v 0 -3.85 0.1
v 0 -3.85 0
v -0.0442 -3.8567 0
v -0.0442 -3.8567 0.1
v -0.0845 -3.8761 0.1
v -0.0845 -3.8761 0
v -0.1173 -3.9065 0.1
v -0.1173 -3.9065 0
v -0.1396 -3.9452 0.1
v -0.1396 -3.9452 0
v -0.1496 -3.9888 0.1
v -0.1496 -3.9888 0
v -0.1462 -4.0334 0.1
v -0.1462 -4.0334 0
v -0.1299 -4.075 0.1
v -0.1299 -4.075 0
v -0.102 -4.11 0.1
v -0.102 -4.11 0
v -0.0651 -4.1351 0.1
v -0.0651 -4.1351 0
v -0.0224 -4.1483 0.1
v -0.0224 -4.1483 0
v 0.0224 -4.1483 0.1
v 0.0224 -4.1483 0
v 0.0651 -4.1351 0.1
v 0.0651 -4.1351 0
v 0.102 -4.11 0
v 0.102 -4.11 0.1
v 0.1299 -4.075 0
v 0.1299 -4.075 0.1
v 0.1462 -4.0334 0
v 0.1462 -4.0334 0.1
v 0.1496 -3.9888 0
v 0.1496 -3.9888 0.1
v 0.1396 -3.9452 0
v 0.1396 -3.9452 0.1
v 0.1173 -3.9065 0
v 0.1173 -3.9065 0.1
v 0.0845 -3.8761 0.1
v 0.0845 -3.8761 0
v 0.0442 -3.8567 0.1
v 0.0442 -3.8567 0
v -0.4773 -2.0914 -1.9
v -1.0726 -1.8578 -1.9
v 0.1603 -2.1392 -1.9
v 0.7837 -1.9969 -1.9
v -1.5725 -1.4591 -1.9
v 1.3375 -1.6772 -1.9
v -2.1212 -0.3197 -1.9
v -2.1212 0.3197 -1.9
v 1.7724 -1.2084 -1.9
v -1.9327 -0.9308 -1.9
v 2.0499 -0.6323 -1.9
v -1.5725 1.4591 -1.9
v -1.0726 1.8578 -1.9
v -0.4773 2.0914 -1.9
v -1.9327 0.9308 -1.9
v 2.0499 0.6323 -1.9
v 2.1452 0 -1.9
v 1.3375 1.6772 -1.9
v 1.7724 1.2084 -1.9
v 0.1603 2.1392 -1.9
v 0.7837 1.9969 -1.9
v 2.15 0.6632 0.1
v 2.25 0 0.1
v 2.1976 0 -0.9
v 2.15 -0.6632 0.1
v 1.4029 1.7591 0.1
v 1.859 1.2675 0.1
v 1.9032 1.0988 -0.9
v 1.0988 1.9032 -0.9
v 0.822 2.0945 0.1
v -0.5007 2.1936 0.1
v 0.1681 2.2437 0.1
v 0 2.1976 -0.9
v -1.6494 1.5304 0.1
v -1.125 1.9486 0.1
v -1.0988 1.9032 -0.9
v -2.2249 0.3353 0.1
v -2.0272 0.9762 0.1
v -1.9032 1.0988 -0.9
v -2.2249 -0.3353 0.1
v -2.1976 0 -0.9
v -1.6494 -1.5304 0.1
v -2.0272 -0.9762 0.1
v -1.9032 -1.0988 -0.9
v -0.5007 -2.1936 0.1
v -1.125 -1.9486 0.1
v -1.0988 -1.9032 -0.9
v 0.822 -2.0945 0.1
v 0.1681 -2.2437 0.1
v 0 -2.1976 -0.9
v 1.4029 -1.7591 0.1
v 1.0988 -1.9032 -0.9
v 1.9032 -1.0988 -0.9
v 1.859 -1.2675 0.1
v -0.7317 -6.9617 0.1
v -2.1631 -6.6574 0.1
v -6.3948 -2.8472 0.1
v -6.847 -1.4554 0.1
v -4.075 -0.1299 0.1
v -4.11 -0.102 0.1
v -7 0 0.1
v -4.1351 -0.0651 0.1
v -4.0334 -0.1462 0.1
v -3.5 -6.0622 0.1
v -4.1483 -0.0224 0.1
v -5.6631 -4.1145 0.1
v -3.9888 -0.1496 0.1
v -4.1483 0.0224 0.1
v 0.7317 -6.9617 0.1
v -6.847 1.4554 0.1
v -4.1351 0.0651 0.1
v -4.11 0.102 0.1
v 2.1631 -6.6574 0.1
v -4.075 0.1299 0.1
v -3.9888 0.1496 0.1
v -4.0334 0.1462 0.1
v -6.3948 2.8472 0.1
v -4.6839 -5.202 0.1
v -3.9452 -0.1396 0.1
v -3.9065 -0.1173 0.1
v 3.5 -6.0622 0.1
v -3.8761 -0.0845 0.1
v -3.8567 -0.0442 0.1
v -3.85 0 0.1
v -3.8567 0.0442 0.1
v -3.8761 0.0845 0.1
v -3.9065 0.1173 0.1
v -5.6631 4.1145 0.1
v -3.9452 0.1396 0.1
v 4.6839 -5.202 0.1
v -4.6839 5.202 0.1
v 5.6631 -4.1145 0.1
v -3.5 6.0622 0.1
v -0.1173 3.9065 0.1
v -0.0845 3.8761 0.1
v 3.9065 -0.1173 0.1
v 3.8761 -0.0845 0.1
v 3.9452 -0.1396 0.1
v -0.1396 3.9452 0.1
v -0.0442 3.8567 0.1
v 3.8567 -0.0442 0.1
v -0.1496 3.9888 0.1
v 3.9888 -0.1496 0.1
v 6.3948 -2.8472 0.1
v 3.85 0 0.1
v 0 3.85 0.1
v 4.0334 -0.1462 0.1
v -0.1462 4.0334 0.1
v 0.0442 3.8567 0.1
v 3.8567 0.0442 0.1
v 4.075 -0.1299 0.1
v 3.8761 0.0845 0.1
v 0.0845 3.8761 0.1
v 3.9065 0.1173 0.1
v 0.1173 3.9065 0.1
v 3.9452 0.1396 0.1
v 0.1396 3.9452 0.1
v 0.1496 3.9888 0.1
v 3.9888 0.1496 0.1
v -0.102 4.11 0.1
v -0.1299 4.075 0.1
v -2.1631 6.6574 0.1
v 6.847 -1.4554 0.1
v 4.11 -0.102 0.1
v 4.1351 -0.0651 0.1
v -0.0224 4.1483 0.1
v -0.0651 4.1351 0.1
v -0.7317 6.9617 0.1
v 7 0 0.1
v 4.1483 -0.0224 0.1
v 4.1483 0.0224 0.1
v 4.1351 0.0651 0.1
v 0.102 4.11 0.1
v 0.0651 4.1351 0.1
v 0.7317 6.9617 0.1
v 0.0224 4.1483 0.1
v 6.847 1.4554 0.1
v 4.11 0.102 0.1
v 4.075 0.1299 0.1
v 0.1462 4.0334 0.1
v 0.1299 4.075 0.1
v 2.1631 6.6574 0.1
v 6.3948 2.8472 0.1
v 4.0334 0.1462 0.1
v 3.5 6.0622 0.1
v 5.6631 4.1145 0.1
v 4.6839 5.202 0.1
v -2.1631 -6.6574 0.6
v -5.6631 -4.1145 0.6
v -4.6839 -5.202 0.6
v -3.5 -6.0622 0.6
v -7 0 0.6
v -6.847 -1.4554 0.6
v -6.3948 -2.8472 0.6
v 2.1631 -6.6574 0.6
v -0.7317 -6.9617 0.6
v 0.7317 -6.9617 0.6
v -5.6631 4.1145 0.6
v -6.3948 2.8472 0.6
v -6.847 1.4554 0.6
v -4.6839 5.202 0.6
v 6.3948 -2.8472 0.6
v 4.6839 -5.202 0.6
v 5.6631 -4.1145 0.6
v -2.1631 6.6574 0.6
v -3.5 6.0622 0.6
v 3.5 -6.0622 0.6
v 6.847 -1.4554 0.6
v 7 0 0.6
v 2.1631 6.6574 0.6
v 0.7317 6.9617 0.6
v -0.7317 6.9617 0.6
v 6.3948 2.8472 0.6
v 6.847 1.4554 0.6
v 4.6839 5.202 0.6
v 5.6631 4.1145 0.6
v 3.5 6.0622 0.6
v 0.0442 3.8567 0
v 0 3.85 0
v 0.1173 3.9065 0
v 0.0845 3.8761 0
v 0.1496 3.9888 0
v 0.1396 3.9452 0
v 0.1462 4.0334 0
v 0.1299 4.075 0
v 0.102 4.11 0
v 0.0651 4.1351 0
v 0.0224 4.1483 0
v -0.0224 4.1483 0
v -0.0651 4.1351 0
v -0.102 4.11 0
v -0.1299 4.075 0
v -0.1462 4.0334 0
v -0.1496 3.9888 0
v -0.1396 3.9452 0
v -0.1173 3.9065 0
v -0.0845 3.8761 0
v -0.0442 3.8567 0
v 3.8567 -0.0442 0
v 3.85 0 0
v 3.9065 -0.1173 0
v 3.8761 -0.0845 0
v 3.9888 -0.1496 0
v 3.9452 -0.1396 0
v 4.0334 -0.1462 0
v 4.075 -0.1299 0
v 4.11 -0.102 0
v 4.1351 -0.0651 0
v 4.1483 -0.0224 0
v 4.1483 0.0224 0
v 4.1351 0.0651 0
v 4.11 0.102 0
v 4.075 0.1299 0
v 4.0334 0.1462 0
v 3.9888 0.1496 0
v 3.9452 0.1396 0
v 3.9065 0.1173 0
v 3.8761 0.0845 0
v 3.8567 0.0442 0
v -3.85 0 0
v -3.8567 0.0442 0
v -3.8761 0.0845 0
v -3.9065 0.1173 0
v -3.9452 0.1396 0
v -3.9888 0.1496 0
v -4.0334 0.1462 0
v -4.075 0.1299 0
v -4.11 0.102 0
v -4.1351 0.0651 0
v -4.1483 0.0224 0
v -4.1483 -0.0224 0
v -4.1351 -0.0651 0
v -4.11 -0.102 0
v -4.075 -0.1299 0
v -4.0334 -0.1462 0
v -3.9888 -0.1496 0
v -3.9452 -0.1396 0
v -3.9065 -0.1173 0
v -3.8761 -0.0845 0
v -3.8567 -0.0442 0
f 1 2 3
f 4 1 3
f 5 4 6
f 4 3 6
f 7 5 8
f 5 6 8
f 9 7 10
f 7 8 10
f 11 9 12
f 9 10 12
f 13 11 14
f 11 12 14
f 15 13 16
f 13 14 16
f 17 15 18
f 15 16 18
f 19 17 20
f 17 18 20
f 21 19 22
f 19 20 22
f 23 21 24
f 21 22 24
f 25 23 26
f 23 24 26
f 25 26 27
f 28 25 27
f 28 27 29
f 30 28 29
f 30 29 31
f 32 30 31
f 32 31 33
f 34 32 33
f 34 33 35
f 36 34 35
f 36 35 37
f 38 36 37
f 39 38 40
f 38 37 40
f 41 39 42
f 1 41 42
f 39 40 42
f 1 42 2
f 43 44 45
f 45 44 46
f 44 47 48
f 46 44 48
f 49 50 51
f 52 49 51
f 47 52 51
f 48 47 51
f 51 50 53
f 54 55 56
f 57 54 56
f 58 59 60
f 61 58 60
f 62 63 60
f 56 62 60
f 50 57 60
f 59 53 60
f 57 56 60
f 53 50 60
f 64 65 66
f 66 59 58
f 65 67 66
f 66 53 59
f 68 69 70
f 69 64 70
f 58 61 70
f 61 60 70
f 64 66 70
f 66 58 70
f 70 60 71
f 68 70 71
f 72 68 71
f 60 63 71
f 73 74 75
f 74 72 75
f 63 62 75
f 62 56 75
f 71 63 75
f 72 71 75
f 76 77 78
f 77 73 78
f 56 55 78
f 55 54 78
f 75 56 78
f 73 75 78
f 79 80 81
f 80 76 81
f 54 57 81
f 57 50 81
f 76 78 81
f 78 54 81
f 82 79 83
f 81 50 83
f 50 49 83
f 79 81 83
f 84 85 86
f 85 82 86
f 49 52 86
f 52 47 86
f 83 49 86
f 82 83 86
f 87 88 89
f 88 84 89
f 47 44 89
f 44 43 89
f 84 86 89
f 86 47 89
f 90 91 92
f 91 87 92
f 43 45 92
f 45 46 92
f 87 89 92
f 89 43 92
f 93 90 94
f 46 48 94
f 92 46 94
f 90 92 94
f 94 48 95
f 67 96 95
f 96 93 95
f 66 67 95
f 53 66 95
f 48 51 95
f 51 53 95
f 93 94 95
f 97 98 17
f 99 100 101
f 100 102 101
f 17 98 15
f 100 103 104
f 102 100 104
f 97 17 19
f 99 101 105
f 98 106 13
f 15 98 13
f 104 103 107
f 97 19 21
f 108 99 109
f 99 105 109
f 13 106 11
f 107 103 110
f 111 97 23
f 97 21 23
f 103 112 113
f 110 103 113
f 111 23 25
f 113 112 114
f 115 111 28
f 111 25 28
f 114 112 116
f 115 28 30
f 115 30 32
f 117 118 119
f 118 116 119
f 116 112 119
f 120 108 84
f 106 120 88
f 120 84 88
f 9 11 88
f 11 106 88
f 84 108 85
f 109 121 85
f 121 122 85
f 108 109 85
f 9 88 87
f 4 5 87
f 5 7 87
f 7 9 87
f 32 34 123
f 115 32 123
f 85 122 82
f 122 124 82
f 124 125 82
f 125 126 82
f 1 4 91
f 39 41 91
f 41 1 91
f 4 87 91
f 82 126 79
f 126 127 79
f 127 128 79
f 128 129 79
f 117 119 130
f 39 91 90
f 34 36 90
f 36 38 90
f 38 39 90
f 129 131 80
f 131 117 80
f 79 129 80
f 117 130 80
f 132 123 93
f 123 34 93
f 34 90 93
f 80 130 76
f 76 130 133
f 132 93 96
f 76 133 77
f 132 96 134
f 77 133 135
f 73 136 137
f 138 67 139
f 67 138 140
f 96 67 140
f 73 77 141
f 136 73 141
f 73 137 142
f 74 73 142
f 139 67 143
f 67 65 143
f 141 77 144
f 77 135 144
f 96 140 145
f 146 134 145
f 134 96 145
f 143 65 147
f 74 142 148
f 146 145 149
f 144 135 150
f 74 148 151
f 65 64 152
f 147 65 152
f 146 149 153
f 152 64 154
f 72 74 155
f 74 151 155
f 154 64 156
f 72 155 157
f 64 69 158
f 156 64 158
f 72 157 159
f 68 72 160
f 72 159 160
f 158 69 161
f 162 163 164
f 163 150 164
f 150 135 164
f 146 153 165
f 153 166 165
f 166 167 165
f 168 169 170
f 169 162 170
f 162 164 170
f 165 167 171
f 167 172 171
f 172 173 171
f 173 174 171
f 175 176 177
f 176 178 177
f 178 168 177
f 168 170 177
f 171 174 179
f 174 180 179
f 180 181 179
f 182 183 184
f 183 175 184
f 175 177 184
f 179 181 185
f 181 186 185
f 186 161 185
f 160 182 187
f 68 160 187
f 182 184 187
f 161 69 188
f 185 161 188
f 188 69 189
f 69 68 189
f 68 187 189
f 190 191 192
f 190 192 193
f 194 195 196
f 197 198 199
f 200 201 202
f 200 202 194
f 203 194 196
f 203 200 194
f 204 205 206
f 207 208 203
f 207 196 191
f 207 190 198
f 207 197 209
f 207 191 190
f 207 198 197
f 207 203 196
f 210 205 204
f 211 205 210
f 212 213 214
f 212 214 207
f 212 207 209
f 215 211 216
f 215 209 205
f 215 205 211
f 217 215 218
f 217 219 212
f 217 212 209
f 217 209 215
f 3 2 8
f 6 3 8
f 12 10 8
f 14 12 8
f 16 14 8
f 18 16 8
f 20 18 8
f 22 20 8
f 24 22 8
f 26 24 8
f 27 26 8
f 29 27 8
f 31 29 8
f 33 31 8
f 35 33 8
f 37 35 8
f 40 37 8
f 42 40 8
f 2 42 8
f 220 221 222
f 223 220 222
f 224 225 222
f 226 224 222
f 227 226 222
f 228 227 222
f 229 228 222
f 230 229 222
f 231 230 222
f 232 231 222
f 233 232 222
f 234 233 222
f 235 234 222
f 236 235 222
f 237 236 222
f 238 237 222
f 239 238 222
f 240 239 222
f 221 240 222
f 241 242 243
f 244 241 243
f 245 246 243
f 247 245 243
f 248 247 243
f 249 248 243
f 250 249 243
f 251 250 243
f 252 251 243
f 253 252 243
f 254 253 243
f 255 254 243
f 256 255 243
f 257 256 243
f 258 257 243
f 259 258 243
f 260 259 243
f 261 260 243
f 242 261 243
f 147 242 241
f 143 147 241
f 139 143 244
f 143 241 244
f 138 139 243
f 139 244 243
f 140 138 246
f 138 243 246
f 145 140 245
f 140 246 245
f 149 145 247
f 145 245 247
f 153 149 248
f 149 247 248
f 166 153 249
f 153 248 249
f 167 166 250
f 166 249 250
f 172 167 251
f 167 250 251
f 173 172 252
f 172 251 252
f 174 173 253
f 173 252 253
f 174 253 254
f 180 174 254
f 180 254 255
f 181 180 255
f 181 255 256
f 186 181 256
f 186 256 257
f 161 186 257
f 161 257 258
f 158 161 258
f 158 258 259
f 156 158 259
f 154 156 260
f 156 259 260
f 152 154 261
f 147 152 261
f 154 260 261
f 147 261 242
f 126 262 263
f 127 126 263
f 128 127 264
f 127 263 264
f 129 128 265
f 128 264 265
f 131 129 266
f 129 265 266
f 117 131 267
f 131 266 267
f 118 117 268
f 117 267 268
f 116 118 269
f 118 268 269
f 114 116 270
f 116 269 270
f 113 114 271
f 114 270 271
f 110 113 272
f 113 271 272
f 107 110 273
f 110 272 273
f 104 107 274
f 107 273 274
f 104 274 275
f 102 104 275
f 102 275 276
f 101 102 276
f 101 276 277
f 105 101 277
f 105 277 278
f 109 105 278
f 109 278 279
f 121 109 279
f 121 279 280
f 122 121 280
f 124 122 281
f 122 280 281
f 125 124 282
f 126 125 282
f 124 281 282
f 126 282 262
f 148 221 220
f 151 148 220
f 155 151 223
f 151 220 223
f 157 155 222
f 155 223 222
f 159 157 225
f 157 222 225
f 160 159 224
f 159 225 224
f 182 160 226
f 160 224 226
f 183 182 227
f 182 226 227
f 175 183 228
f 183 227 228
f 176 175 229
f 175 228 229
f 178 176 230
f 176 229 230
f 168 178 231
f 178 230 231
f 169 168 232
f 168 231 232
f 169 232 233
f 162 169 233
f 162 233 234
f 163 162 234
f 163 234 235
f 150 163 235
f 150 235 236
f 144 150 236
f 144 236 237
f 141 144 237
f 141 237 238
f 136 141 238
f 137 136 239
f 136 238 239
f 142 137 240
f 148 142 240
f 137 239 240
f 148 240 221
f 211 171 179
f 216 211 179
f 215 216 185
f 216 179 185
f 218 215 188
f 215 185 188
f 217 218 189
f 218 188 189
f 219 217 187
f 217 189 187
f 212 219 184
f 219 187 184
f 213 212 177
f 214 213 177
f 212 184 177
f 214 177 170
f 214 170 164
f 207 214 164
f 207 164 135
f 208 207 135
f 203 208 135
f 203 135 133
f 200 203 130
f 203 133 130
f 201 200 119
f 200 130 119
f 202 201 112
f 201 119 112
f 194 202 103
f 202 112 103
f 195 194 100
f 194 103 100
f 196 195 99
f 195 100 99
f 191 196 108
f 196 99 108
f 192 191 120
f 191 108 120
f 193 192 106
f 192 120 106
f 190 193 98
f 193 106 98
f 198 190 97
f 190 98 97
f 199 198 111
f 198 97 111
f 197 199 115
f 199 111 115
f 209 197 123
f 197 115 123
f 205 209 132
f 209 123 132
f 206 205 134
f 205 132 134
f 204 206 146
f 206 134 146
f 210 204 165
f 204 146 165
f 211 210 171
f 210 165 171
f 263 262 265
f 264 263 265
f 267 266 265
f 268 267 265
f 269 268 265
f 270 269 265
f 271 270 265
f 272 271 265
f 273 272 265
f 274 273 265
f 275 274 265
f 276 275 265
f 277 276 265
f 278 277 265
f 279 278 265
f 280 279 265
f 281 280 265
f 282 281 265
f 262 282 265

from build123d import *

# Parameters (mm, degrees)
F0_R            = 2.25
F1_DEPTH        = 2
F1_TAPER        = 3
F2_R            = 7
F3_DEPTH        = 0.5
F5_R            = 0.15
F6_DEPTH        = 0.1
F6_COPIES_COUNT = 4


# Not quite as in the source:
# - a pattern or mirror of a feature is missing from the dataset's text; its kind, count and spacing are read off the source's solid


with BuildPart() as f1:
    # F0 (on Top) → F1 (new body)
    with BuildSketch(Plane.XY):
        Circle(F0_R)
    extrude(amount=-F1_DEPTH, taper=F1_TAPER)

    # F2 (on Top) → F3 (join)
    with BuildSketch(Plane.XY):
        Circle(F2_R)
    extrude(amount=F3_DEPTH)


with BuildPart() as f1_1:
    # F4: moved
    add(f1.part.moved(Location((0, 0, 0.1))))

    # F5 (on Top) → F6 (join)
    with BuildSketch(Plane.XY):
        with Locations((-4, 0)):
            Circle(F5_R)
    f6 = extrude(amount=F6_DEPTH)

    # F6_copies: F6 ×4 about axis
    f6_copies_axis = Axis((0, 0, 0), (0, 0, 1))
    for i in range(1, F6_COPIES_COUNT):
        add(f6.rotate(f6_copies_axis, i * 360 / F6_COPIES_COUNT))


solid = f1_1.part
